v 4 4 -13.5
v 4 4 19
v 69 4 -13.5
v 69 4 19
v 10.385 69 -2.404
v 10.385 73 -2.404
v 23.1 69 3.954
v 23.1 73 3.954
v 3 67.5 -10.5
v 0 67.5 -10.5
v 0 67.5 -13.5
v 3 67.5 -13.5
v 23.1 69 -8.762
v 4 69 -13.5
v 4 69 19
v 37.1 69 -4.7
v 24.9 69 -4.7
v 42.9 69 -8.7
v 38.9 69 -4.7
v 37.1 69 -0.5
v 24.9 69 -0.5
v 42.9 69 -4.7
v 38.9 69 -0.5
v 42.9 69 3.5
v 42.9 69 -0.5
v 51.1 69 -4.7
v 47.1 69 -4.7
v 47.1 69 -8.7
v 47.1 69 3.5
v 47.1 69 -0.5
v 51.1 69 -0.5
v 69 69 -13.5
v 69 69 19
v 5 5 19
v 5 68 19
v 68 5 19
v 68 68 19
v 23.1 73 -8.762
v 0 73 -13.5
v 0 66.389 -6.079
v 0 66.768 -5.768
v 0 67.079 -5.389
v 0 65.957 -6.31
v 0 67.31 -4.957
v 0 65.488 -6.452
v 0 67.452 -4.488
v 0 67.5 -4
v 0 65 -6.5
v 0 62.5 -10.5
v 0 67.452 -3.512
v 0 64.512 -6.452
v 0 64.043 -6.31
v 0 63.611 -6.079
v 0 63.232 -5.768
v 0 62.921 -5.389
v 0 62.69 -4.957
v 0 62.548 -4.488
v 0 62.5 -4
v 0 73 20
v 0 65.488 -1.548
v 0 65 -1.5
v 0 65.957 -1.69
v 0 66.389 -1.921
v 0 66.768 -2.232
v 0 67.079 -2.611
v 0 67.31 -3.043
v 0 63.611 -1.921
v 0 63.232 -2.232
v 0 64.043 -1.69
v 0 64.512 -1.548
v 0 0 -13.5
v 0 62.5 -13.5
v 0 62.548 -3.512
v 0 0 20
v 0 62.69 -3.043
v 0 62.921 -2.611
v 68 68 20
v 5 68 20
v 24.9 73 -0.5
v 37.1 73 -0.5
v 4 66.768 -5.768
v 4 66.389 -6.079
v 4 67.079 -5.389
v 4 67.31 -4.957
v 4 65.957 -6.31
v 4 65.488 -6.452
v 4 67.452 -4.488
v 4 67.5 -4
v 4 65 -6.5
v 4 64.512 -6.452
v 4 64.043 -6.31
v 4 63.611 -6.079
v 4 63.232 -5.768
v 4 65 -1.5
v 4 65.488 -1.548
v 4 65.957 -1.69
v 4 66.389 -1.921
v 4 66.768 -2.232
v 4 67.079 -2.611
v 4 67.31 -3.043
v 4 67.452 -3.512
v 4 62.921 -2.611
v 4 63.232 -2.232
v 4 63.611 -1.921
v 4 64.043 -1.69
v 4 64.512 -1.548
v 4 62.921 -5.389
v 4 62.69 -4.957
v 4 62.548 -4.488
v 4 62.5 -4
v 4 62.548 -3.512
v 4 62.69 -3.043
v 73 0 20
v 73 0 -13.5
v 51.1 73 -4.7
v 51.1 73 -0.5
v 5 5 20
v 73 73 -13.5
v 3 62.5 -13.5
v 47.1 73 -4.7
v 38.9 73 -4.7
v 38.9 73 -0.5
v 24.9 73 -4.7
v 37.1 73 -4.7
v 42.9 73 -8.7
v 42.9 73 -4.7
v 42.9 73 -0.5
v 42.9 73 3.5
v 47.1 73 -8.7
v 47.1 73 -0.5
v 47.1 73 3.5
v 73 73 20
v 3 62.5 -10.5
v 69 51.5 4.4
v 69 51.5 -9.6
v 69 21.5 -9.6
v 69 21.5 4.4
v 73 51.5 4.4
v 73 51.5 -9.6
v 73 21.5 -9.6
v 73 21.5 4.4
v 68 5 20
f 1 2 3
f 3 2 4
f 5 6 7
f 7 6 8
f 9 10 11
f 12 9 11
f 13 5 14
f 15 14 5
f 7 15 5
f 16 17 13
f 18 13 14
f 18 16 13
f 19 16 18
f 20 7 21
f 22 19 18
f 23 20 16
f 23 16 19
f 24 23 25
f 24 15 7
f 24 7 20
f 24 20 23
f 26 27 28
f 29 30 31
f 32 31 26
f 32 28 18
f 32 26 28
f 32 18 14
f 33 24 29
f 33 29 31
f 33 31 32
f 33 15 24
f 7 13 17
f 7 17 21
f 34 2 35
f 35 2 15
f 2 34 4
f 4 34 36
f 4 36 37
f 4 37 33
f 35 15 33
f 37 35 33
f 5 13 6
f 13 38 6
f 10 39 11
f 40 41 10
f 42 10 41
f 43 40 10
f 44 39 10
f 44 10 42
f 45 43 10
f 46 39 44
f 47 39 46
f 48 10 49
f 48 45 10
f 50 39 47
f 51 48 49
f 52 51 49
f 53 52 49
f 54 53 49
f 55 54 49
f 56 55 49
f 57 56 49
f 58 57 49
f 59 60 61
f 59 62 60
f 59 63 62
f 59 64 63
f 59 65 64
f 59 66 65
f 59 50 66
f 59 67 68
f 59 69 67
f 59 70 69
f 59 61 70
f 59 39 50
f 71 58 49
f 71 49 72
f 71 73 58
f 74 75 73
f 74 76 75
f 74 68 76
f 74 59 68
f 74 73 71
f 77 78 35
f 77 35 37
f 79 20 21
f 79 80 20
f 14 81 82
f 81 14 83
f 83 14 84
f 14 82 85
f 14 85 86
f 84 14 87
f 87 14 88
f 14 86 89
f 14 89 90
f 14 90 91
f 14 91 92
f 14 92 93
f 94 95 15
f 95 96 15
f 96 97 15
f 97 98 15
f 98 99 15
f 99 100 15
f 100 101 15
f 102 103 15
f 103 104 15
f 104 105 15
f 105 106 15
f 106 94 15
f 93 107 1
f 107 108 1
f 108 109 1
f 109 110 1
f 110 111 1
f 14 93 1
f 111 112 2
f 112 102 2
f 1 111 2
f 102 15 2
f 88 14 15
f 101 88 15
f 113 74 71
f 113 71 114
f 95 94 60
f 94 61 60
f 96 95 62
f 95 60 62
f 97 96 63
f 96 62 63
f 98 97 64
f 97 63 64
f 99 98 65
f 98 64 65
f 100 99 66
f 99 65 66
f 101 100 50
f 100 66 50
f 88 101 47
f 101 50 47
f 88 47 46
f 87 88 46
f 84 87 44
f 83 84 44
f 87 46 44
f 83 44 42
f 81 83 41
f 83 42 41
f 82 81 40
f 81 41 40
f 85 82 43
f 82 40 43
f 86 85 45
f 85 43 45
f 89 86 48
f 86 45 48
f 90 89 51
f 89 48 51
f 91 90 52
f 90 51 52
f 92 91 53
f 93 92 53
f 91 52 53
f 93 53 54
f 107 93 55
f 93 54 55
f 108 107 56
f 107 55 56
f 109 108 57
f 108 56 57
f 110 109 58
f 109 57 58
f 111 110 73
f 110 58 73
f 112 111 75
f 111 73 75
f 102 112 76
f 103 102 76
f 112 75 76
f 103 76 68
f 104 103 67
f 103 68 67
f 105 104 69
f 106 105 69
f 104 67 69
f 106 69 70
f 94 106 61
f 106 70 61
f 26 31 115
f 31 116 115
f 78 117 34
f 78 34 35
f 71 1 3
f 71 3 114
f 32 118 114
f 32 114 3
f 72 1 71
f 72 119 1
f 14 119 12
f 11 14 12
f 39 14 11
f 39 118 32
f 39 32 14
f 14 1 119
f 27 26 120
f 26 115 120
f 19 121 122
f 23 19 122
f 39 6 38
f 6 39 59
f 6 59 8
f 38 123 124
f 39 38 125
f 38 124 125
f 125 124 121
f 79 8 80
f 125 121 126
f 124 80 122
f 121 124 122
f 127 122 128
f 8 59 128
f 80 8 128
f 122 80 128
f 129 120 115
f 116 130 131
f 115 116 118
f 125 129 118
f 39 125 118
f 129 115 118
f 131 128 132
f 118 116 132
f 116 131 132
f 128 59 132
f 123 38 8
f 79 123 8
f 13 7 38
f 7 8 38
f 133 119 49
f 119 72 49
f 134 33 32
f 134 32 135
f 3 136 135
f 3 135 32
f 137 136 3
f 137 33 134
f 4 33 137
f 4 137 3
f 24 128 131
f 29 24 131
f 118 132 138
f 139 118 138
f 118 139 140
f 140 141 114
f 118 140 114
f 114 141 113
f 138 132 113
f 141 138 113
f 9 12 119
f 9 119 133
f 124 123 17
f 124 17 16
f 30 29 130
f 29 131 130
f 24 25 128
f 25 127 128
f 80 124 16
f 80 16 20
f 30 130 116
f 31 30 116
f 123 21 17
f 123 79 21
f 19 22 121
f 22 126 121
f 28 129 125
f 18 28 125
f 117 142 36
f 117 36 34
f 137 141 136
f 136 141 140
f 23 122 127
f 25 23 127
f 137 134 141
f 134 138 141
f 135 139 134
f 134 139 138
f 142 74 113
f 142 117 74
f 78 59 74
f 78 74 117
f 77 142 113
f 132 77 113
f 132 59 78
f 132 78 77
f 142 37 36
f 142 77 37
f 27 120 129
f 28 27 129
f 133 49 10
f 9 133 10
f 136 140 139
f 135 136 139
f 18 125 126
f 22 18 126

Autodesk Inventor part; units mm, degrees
ref_plane "YZ Plane" through (0, 0, 0) normal (1, 0, 0) x (0, 1, 0)
ref_plane "XZ Plane" through (0, 0, 0) normal (0, 1, 0) x (-1, 0, 0)
ref_plane "XY Plane" through (0, 0, 0) normal (0, 0, 1) x (1, 0, 0)
sketch "Sketch2" plane through (0, 0, 0) normal (0, 0, 1) x (1, 0, 0)
  line L0 (0, 0) -> (73, 0)
  line L1 (73, 0) -> (73, 73)
  line L2 (73, 73) -> (0, 73)
  line L3 (0, 73) -> (0, 0)
  dimension "d2" = 73
  dimension "d3" = 73
extrude "Extrusion1" add sketch "Sketch2" along normal blind 20
sketch "Sketch3" plane through (0, 0, 0) normal (0, 0, -1) x (-1, 0, 0)
  line L0 (-73, 73) -> (0, 73) projected
  line L1 (0, 73) -> (0, 0) projected
  line L2 (-73, 73) -> (0, 73)
  line L3 (0, 73) -> (0, 0)
  line L4 (0, 0) -> (-73, 0)
  line L5 (-73, 0) -> (-73, 73)
  line L6 (-69, 69) -> (-4, 69)
  line L7 (-4, 69) -> (-4, 4)
  line L8 (-4, 4) -> (-69, 4)
  line L9 (-69, 4) -> (-69, 69)
  dimension "d6" = 4
extrude "Extrusion2" cut sketch "Sketch3" against normal blind 20 contours L6 L7 L8 L9
sketch "Sketch4" plane through (0, 0, 20) normal (0, 0, 1) x (1, 0, 0)
  line L0 (4, 4) -> (4, 69) projected
  line L1 (69, 69) -> (69, 4) projected
  line L2 (4, 4) -> (69, 4)
  line L3 (69, 4) -> (69, 69)
  line L4 (69, 69) -> (4, 69)
  line L5 (4, 69) -> (4, 4)
  line L6 (5, 68) -> (68, 68)
  line L7 (68, 68) -> (68, 5)
  line L8 (68, 5) -> (5, 5)
  line L9 (5, 5) -> (5, 68)
  point P0 (0, 0)
  point P1 (69, 4)
  point P2 (4, 69)
  dimension "d9" = 1
extrude "Extrusion3" add sketch "Sketch4" against normal blind 1
sketch "Sketch5" plane through (0, 0, 0) normal (0, 0, -1) x (-1, 0, 0)
  line L0 (-4, 69) -> (-4, 4) projected
  line L1 (-4, 4) -> (-69, 4) projected
  line L2 (-4, 69) -> (-69, 69)
  line L3 (-69, 69) -> (-69, 4)
  line L4 (-69, 4) -> (-4, 4)
  line L5 (-4, 4) -> (-4, 69)
  line L6 (0, 73) -> (0, 0) projected
  line L7 (0, 0) -> (-73, 0) projected
  line L8 (0, 73) -> (-73, 73)
  line L9 (-73, 73) -> (-73, 0)
  line L10 (-73, 0) -> (0, 0)
  line L11 (0, 0) -> (0, 73)
extrude "Extrusion4" add sketch "Sketch5" along normal blind 13.5
sketch "Sketch7" plane through (73, 0, 20) normal (1, 0, 0) x (0, 0, -1)
  line L0 (33.5, 69) -> (33.5, 4) projected
  line L1 (29.6, 36.5) -> (29.6, 51.5)
  line L2 (29.6, 51.5) -> (15.6, 51.5)
  line L3 (15.6, 51.5) -> (15.6, 21.5)
  line L4 (15.6, 21.5) -> (29.6, 21.5)
  line L5 (29.6, 21.5) -> (29.6, 36.5)
  point P0 (20, 0)
  dimension "d43" = 15
  dimension "d44" = 14
  dimension "d45" = 30
extrude "Extrusion5" cut sketch "Sketch7" against normal blind 4
sketch "Sketch8" plane through (0, 0, 20) normal (-1, 0, 0) x (0, 0, 1)
  circle A0 centre (-24, 65) radius 2.5
  point P0 (-20, 0)
  point P1 (-33.5, 69)
  dimension "d106" = 5
extrude "Extrusion6" cut sketch "Sketch8" against normal blind 4
sketch "Sketch10" plane through (0, 73, 20) normal (0, 1, 0) x (1, 0, 0)
  line L0 (0, 0) -> (73, 0) projected
  line L1 (73, 33.5) -> (0, 33.5) projected
  line L2 (0, 33.5) -> (0, 0) projected
  line L3 (4, 33.5) -> (4, 1) projected
  line L4 (51.2, 20.4) -> (47.2, 20.4)
  line L5 (47.2, 20.4) -> (47.2, 16.4)
  line L6 (47.2, 16.4) -> (42.8, 16.4)
  line L7 (42.8, 16.4) -> (42.8, 20.4)
  line L8 (42.8, 20.4) -> (38.8, 20.4)
  line L9 (38.8, 20.4) -> (38.8, 24.8)
  line L10 (38.8, 24.8) -> (42.8, 24.8)
  line L11 (42.8, 24.8) -> (42.8, 28.8)
  line L12 (42.8, 28.8) -> (47.2, 28.8)
  line L13 (47.2, 28.8) -> (47.2, 24.8)
  line L14 (47.2, 24.8) -> (51.2, 24.8)
  line L15 (51.2, 24.8) -> (51.2, 20.4)
  line L16 (24.8, 20.4) -> (37.2, 20.4)
  line L17 (37.2, 20.4) -> (37.2, 24.8)
  line L18 (37.2, 24.8) -> (24.8, 24.8)
  line L19 (24.8, 24.8) -> (24.8, 20.4)
  line L20 (10.161, 22.4041) -> (23.2, 28.9236)
  line L21 (23.2, 28.9236) -> (23.2, 15.8846)
  line L22 (23.2, 15.8846) -> (10.161, 22.4041)
  line L23 (23.1, 28.7618) -> (10.3846, 22.4041)
  line L24 (10.3846, 22.4041) -> (23.1, 16.0464)
  line L25 (23.1, 16.0464) -> (23.1, 28.7618)
  line L26 (24.9, 24.7) -> (37.1, 24.7)
  line L27 (37.1, 24.7) -> (37.1, 20.5)
  line L28 (37.1, 20.5) -> (24.9, 20.5)
  line L29 (24.9, 20.5) -> (24.9, 24.7)
  line L30 (42.9, 24.7) -> (38.9, 24.7)
  line L31 (38.9, 24.7) -> (38.9, 20.5)
  line L32 (38.9, 20.5) -> (42.9, 20.5)
  line L33 (42.9, 20.5) -> (42.9, 16.5)
  line L34 (42.9, 16.5) -> (47.1, 16.5)
  line L35 (47.1, 16.5) -> (47.1, 20.5)
  line L36 (47.1, 20.5) -> (51.1, 20.5)
  line L37 (51.1, 20.5) -> (51.1, 24.7)
  line L38 (51.1, 24.7) -> (47.1, 24.7)
  line L39 (47.1, 24.7) -> (47.1, 28.7)
  line L40 (47.1, 28.7) -> (42.9, 28.7)
  line L41 (42.9, 28.7) -> (42.9, 24.7)
  point P0 (0, 20)
  dimension "d95" = 0.1
  dimension "d96" = 0.1
  dimension "d97" = 0.1
extrude "Extrusion8" cut sketch "Sketch10" against normal blind 4 contours L4 L5 L6 L7 L8 L9 L10 L11 L12 L13 L14 L15 | L19 L18 L17 L16 | L20 L21 L22 | L25 L24 L23 | L26 L27 L28 L29 | L41 L40 L39 L38 L37 L36 L35 L34 L33 L32 L31 L30
extrude "Extrusion9" add sketch "Sketch10" against normal blind 4
sketch "Sketch11" plane through (0, 0, 20) normal (-1, 0, 0) x (0, 0, 1)
  circle A0 centre (-24, 65) radius 2.5 projected
  line L0 (-33.5, 4) -> (-33.5, 69) projected
  line L1 (-33.5, 65) -> (-33.5, 62.5)
  line L2 (-33.5, 62.5) -> (-30.5, 62.5)
  line L3 (-30.5, 62.5) -> (-30.5, 65)
  line L4 (-30.5, 65) -> (-30.5, 67.5)
  line L5 (-30.5, 67.5) -> (-33.5, 67.5)
  line L6 (-33.5, 67.5) -> (-33.5, 65)
  point P0 (-20, 0)
  dimension "d100" = 2.5
  dimension "d101" = 3
  dimension "d102" = 2.5
  dimension "d103" = 2.5
extrude "Extrusion10" cut sketch "Sketch11" against normal blind 3 contours L0 L5 L4 L3 L2
properties part number "Case"
